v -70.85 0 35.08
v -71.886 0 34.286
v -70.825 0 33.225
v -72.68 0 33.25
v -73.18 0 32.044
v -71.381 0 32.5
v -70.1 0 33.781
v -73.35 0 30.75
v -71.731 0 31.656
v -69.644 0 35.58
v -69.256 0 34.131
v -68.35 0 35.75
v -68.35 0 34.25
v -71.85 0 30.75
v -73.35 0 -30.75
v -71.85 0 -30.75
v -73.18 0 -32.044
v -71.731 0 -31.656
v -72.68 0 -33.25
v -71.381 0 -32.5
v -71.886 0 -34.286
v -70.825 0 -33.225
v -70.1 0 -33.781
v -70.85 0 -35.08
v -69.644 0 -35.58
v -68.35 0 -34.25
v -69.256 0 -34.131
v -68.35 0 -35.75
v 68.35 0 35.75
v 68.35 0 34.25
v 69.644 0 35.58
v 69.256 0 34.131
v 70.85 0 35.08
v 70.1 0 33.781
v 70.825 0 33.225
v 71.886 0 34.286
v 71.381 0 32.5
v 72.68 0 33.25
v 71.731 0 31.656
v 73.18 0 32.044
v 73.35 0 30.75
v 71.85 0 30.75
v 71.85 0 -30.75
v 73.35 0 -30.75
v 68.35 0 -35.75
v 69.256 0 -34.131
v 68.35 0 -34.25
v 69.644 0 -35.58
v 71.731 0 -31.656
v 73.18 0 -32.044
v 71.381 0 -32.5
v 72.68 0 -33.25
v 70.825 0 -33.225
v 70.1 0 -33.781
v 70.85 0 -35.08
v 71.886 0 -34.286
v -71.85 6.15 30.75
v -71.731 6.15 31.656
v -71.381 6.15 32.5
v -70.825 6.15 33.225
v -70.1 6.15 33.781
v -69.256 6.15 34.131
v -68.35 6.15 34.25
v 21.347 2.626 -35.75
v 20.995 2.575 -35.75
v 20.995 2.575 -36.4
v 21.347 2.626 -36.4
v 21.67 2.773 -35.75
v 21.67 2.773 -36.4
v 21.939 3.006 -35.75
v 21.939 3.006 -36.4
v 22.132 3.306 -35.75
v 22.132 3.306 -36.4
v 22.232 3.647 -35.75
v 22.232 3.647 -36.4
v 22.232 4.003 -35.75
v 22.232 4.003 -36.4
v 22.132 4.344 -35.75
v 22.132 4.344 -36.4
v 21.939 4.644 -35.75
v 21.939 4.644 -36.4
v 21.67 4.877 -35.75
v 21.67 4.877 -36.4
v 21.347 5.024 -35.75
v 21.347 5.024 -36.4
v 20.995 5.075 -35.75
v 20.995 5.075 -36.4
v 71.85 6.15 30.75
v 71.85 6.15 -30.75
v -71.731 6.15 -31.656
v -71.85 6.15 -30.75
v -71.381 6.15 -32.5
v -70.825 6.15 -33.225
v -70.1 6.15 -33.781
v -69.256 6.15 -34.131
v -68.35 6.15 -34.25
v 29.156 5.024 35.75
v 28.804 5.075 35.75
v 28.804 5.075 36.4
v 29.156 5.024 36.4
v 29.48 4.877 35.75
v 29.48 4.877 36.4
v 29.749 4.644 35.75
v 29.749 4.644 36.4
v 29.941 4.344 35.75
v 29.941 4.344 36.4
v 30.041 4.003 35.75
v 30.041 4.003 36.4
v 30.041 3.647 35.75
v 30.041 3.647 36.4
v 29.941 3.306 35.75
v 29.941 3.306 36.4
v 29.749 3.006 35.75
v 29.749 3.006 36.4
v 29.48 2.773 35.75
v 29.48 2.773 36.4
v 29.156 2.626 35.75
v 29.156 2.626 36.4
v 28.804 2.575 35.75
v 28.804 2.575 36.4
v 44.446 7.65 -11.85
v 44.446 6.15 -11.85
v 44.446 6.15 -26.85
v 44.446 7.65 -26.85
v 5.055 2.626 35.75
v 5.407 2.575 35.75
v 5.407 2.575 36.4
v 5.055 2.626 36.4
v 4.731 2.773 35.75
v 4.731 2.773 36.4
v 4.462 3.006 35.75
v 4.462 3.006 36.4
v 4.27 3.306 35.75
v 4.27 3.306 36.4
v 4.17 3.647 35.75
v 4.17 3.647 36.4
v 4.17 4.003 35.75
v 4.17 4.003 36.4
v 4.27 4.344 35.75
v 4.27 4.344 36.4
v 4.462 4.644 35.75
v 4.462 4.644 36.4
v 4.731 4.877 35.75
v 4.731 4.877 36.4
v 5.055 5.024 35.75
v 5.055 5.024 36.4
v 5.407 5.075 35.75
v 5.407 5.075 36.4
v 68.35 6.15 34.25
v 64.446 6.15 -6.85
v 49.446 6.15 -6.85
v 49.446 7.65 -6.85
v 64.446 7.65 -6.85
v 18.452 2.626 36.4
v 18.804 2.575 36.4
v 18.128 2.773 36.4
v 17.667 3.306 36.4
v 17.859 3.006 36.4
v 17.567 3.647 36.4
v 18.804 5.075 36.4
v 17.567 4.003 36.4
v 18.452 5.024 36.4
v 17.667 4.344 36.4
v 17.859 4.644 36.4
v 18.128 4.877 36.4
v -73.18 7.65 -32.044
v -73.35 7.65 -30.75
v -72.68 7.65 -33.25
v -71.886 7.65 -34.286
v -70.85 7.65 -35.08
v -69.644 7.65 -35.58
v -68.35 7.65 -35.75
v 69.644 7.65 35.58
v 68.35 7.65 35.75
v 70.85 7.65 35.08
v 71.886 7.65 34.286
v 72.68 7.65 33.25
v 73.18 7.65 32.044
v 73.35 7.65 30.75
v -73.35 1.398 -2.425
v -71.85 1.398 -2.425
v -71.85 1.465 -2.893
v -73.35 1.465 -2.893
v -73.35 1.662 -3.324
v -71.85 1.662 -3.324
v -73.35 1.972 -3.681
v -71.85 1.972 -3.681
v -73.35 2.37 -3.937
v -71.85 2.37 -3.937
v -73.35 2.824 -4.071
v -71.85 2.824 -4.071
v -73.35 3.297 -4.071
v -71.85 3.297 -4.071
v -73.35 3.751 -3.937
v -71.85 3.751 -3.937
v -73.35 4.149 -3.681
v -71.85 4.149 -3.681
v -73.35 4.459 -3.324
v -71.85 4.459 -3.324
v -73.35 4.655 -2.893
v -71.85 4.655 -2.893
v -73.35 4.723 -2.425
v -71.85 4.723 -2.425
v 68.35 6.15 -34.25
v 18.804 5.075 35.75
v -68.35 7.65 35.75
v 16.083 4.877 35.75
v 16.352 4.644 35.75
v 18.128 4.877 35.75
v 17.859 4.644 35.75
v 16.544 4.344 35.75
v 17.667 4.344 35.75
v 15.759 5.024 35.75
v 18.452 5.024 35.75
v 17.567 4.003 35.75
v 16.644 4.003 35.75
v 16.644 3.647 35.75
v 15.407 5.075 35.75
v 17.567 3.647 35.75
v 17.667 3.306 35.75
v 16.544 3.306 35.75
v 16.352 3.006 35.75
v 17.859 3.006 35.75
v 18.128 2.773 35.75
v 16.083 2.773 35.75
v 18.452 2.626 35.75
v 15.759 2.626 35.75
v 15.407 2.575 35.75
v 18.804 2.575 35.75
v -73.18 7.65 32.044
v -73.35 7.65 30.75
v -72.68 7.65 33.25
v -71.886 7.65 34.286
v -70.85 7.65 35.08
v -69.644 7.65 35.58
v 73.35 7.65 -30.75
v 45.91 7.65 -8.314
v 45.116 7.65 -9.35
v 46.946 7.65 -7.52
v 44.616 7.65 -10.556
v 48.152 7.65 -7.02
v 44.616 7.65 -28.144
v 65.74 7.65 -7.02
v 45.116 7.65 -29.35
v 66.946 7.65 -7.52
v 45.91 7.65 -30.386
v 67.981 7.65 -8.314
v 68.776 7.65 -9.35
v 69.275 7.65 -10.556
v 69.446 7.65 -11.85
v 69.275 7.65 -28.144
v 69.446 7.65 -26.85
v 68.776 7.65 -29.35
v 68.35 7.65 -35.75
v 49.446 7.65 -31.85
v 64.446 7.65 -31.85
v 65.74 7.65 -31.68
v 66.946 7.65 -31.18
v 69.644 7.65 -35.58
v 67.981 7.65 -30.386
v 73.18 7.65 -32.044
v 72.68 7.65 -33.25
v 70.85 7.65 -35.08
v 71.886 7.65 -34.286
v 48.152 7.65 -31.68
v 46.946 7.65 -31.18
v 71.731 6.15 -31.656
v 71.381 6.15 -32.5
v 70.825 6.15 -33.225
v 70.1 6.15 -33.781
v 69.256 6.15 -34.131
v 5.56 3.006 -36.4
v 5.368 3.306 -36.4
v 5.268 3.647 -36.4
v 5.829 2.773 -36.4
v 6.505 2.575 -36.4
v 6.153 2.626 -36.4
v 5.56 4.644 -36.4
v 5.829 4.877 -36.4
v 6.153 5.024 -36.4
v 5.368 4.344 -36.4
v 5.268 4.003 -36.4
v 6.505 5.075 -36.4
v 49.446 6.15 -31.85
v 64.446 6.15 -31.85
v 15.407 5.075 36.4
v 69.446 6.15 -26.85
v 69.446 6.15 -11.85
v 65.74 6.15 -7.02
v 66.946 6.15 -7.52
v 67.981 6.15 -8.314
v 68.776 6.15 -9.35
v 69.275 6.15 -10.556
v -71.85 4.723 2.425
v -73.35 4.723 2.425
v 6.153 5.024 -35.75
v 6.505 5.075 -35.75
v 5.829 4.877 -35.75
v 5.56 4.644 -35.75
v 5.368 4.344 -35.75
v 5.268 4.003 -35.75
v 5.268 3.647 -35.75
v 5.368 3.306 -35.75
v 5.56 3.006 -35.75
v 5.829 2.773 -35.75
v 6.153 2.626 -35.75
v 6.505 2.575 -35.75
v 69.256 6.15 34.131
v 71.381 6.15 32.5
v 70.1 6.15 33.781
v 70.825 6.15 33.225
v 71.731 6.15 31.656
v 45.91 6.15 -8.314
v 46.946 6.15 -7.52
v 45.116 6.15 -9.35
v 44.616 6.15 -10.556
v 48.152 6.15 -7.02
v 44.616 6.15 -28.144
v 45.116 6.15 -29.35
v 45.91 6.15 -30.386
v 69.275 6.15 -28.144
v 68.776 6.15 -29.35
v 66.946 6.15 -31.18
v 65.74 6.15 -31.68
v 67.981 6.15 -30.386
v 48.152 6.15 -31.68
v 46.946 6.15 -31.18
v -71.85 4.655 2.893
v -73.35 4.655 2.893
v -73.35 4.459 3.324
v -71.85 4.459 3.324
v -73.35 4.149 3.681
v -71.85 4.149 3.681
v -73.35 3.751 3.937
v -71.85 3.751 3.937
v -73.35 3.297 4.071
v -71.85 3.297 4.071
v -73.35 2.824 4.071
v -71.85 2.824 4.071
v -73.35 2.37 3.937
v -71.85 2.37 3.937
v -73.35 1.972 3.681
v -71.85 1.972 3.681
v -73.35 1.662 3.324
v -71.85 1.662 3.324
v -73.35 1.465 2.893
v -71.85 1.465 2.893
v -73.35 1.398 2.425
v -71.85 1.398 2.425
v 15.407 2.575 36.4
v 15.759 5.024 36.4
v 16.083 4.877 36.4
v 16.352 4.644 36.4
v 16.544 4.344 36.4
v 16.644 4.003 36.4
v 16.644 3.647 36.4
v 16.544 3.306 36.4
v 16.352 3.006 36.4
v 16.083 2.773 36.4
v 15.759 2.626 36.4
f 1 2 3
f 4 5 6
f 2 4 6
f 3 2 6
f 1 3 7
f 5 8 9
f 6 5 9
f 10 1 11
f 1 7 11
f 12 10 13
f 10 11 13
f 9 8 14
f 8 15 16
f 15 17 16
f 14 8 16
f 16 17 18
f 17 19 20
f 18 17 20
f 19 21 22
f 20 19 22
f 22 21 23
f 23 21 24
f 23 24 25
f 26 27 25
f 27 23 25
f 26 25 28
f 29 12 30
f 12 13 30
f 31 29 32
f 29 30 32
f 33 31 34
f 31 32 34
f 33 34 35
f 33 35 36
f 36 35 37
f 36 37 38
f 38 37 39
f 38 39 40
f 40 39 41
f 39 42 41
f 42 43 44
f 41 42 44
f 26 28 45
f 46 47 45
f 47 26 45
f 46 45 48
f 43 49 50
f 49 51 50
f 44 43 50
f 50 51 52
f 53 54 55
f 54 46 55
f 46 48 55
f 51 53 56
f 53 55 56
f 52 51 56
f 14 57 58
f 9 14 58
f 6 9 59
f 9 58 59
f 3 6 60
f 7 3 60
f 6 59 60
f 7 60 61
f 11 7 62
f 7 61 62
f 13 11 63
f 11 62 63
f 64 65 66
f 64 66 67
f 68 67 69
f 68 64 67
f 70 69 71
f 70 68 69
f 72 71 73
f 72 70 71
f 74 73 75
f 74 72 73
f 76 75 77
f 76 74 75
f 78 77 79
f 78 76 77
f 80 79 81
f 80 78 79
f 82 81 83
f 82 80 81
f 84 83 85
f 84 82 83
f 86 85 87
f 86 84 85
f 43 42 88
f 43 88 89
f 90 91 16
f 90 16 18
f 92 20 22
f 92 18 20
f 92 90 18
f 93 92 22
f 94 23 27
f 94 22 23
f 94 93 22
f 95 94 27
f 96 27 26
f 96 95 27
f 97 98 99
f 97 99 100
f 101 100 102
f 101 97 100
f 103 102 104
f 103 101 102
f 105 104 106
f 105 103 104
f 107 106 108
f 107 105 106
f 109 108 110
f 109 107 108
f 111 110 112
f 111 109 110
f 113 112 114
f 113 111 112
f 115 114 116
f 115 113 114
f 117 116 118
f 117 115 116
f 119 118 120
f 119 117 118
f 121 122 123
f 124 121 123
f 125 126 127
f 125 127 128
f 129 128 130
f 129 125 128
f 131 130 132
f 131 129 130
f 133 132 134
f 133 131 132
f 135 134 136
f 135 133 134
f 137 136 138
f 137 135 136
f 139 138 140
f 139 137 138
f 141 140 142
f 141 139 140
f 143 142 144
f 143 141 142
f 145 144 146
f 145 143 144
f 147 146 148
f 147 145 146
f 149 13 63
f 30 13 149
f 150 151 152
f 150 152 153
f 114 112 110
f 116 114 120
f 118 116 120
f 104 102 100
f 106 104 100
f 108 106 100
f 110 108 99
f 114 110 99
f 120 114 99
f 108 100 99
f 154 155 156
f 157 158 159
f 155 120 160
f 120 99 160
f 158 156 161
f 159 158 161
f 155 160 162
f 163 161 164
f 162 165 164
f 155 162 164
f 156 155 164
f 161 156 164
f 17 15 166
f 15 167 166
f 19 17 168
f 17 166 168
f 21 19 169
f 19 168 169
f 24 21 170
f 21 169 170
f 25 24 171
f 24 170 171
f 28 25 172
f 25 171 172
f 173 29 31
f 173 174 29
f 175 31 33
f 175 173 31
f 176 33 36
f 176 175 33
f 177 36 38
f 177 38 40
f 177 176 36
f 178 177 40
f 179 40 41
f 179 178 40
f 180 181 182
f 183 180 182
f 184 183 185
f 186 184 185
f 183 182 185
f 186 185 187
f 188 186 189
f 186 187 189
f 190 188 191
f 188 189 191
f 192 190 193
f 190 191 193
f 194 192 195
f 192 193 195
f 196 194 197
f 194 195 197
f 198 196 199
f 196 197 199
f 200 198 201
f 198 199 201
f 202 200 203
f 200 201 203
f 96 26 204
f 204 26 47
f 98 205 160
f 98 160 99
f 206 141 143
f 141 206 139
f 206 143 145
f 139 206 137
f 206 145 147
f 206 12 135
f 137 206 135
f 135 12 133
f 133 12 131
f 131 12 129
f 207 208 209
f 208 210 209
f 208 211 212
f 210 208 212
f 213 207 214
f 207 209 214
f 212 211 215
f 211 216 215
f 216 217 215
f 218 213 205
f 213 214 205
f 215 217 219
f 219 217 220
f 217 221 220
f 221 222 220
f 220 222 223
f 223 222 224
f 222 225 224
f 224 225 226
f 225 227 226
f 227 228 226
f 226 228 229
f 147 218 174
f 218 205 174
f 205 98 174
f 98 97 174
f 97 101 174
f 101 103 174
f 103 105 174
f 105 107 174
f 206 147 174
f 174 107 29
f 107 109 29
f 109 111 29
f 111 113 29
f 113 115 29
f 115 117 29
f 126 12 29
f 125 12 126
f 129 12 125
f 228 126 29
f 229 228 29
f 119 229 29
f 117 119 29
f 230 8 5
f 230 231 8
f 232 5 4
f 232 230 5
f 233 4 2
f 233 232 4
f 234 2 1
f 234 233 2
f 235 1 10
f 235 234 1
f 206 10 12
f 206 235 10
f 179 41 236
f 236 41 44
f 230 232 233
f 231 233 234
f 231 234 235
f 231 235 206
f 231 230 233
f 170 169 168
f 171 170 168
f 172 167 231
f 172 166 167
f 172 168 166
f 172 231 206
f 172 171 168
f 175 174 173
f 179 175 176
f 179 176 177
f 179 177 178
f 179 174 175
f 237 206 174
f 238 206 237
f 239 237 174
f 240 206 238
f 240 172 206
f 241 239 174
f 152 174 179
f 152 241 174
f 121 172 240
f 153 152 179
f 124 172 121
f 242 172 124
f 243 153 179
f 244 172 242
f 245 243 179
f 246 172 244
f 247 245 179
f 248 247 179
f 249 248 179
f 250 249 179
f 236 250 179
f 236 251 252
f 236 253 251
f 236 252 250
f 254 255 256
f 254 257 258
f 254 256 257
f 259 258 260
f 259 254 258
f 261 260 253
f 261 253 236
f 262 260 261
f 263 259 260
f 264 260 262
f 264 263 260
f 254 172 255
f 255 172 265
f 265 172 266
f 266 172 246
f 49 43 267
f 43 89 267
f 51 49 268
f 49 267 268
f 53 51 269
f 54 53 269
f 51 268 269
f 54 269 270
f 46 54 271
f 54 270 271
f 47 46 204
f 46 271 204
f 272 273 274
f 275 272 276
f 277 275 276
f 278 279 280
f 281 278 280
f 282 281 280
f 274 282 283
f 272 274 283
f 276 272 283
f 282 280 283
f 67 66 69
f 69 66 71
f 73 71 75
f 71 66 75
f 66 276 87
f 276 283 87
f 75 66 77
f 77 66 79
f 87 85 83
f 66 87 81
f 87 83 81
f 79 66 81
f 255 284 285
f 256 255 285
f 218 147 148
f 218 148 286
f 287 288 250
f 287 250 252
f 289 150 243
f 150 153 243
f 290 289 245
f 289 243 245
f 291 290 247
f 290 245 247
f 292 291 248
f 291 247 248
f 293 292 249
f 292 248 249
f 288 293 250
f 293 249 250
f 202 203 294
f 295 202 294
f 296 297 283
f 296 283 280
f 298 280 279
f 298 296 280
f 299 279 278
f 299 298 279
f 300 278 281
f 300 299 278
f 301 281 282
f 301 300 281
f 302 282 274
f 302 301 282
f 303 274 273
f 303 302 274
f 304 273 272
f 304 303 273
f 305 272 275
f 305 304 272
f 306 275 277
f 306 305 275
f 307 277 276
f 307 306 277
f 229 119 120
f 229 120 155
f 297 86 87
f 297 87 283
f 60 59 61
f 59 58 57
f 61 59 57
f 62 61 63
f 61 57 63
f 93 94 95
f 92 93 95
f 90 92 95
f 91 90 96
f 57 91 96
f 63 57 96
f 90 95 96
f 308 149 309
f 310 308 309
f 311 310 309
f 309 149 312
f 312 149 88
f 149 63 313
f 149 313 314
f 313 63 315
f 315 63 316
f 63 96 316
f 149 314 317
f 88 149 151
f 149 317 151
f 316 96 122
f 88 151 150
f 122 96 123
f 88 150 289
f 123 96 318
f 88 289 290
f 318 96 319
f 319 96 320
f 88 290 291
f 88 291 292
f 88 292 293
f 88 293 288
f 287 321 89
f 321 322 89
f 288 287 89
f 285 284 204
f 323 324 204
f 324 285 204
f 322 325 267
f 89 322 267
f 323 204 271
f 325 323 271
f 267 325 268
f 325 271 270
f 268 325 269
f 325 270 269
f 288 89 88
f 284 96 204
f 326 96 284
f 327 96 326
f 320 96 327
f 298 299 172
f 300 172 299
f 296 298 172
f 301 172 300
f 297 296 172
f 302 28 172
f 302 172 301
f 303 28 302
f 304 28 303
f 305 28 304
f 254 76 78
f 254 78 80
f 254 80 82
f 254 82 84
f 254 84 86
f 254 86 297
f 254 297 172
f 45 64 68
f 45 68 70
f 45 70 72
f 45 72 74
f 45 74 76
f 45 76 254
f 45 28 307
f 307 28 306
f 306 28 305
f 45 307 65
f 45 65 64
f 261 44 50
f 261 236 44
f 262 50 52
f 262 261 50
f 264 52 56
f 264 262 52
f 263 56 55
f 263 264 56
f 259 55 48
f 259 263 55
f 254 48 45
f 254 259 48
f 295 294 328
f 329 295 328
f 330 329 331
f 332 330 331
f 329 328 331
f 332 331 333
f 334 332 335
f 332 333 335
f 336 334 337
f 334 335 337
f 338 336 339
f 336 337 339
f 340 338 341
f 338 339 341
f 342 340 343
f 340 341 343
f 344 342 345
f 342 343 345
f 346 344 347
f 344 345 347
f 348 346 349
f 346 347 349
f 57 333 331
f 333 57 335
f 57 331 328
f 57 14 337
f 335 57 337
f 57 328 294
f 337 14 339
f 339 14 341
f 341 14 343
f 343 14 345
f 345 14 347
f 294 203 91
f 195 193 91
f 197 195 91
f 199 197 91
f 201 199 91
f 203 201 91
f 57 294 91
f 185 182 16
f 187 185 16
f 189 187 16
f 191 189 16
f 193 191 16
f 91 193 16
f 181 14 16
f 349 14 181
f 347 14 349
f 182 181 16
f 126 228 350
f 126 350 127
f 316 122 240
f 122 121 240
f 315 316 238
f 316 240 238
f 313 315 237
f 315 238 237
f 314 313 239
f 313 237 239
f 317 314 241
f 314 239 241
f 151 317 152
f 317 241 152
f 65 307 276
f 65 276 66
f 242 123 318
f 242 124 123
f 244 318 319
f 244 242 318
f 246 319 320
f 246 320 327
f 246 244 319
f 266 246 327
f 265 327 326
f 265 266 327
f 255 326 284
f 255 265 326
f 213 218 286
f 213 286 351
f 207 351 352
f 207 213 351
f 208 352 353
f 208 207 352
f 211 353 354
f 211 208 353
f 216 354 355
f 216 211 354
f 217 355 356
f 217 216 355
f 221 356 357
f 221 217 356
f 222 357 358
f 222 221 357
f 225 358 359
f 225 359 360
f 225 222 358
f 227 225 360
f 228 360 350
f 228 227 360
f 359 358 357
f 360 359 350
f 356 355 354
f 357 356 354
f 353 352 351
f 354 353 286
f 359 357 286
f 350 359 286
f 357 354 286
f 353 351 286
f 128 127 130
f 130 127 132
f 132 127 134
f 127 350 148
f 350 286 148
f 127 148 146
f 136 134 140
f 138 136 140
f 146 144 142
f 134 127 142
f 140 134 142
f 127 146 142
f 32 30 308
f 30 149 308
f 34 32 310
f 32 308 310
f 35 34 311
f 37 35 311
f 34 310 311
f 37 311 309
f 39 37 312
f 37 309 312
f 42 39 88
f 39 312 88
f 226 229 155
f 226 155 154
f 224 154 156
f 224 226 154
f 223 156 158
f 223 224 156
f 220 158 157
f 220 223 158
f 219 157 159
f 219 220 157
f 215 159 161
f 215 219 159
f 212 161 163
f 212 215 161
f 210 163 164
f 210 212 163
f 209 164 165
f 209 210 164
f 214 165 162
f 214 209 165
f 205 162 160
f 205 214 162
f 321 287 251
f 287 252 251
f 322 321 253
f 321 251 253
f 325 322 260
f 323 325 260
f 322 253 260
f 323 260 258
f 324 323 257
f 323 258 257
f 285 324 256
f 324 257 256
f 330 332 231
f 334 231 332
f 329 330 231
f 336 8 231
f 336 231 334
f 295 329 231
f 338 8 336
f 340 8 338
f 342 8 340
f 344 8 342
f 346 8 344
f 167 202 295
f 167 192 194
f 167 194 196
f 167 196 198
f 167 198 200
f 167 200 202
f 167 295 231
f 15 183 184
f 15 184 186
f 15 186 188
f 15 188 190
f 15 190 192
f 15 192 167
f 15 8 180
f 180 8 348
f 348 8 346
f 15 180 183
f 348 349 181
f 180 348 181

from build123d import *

# Parameters (mm, degrees)
SKETCH1_W                 = 146.7
SKETCH1_H                 = 71.5
BASE_DEPTH                = 7.65
CURVES_CASE_R             = 5
SHELL_T                   = -1.5
CAMERA_HOLE_DEPTH         = 82.956131558
CAMERA_HOLE_DEPTH_BACK    = 82.956131558
SKETCH2_W                 = 25
SKETCH2_H                 = 25
CURVES_CAMERA_R           = 5
CHARGER_BOTTOM_DEPTH      = 152.186887659
CHARGER_BOTTOM_DEPTH_BACK = 9.65
VOLUME_BOTTOM_DEPTH       = 0.65
TURN_ON_OFF_DEPTH         = 0.65


with BuildPart() as part:
    # Sketch1 → Base (new body)
    with BuildSketch(Plane(origin=(0, 0, 0), x_dir=(1, 0, 0), z_dir=(0, 1, 0))):
        Rectangle(SKETCH1_W, SKETCH1_H)
    extrude(amount=BASE_DEPTH)

    # Curves case
    curves_case_edges = [part.edges().sort_by_distance(p)[0] for p in [
        (73.35, 3.825, 35.75),
        (-73.35, 3.825, 35.75),
        (-73.35, 3.825, -35.75),
        (73.35, 3.825, -35.75),
    ]]
    fillet(curves_case_edges, radius=CURVES_CASE_R)

    # Shell
    shell_openings = [part.faces().sort_by_distance(p)[0] for p in [
        (0, 0, 0),
    ]]
    offset(amount=SHELL_T, openings=shell_openings, kind=Kind.INTERSECTION)

    # Sketch2 → Camera Hole (cut, two sides: drawn at the far end of the back side and taken through both)
    with BuildSketch(Plane(origin=(0, 7.65, 0), x_dir=(1, 0, 0), z_dir=(0, 1, 0)).offset(-CAMERA_HOLE_DEPTH_BACK)):
        with Locations((56.945704346, 19.35)):
            Rectangle(SKETCH2_W, SKETCH2_H)
    extrude(amount=CAMERA_HOLE_DEPTH + CAMERA_HOLE_DEPTH_BACK, mode=Mode.SUBTRACT)

    # Curves Camera
    curves_camera_edges = [part.edges().sort_by_distance(p)[0] for p in [
        (69.445704346, 6.9, -31.85),
        (69.445704346, 6.9, -6.85),
        (44.445704346, 6.9, -6.85),
        (44.445704346, 6.9, -31.85),
    ]]
    fillet(curves_camera_edges, radius=CURVES_CAMERA_R)

    # Sketch6 → Charger bottom (cut, two sides: drawn at the far end of the back side and taken through both)
    with BuildSketch(Plane.ZY.offset(73.35).offset(-CHARGER_BOTTOM_DEPTH_BACK)):
        with BuildLine():
            Line((-2.425, 4.722712559), (2.425, 4.722712559))
            ThreePointArc((2.425, 4.722712559), (4.087430665, 3.060281894), (2.425, 1.397851228))
            Line((2.425, 1.397851228), (-2.425, 1.397851228))
            ThreePointArc((-2.425, 1.397851228), (-4.087430665, 3.060281894), (-2.425, 4.722712559))
        make_face()
    extrude(amount=CHARGER_BOTTOM_DEPTH + CHARGER_BOTTOM_DEPTH_BACK, mode=Mode.SUBTRACT)

    # Sketch9 → Volume Bottom (add)
    with BuildSketch(Plane.XY.offset(35.75)):
        with BuildLine():
            Line((5.40710355, 5.075), (15.40710355, 5.075))
            ThreePointArc((15.40710355, 5.075), (16.65710355, 3.825), (15.40710355, 2.575))
            Line((15.40710355, 2.575), (5.40710355, 2.575))
            ThreePointArc((5.40710355, 2.575), (4.15710355, 3.825), (5.40710355, 5.075))
        make_face()
        with BuildLine():
            Line((18.803853298, 5.075), (28.803853298, 5.075))
            ThreePointArc((28.803853298, 5.075), (30.053853298, 3.825), (28.803853298, 2.575))
            Line((28.803853298, 2.575), (18.803853298, 2.575))
            ThreePointArc((18.803853298, 2.575), (17.553853298, 3.825), (18.803853298, 5.075))
        make_face()
    extrude(amount=VOLUME_BOTTOM_DEPTH)

    # Sketch11 → Turn on/off (add)
    with BuildSketch(Plane(origin=(0, 0, -35.75), x_dir=(-1, 0, 0), z_dir=(0, 0, -1))):
        with BuildLine():
            Line((-20.994631551, 5.075), (-6.504836948, 5.075))
            ThreePointArc((-6.504836948, 5.075), (-5.254836948, 3.825), (-6.504836948, 2.575))
            Line((-6.504836948, 2.575), (-20.994631551, 2.575))
            ThreePointArc((-20.994631551, 2.575), (-22.244631551, 3.825), (-20.994631551, 5.075))
        make_face()
    extrude(amount=TURN_ON_OFF_DEPTH)


solid = part.part
